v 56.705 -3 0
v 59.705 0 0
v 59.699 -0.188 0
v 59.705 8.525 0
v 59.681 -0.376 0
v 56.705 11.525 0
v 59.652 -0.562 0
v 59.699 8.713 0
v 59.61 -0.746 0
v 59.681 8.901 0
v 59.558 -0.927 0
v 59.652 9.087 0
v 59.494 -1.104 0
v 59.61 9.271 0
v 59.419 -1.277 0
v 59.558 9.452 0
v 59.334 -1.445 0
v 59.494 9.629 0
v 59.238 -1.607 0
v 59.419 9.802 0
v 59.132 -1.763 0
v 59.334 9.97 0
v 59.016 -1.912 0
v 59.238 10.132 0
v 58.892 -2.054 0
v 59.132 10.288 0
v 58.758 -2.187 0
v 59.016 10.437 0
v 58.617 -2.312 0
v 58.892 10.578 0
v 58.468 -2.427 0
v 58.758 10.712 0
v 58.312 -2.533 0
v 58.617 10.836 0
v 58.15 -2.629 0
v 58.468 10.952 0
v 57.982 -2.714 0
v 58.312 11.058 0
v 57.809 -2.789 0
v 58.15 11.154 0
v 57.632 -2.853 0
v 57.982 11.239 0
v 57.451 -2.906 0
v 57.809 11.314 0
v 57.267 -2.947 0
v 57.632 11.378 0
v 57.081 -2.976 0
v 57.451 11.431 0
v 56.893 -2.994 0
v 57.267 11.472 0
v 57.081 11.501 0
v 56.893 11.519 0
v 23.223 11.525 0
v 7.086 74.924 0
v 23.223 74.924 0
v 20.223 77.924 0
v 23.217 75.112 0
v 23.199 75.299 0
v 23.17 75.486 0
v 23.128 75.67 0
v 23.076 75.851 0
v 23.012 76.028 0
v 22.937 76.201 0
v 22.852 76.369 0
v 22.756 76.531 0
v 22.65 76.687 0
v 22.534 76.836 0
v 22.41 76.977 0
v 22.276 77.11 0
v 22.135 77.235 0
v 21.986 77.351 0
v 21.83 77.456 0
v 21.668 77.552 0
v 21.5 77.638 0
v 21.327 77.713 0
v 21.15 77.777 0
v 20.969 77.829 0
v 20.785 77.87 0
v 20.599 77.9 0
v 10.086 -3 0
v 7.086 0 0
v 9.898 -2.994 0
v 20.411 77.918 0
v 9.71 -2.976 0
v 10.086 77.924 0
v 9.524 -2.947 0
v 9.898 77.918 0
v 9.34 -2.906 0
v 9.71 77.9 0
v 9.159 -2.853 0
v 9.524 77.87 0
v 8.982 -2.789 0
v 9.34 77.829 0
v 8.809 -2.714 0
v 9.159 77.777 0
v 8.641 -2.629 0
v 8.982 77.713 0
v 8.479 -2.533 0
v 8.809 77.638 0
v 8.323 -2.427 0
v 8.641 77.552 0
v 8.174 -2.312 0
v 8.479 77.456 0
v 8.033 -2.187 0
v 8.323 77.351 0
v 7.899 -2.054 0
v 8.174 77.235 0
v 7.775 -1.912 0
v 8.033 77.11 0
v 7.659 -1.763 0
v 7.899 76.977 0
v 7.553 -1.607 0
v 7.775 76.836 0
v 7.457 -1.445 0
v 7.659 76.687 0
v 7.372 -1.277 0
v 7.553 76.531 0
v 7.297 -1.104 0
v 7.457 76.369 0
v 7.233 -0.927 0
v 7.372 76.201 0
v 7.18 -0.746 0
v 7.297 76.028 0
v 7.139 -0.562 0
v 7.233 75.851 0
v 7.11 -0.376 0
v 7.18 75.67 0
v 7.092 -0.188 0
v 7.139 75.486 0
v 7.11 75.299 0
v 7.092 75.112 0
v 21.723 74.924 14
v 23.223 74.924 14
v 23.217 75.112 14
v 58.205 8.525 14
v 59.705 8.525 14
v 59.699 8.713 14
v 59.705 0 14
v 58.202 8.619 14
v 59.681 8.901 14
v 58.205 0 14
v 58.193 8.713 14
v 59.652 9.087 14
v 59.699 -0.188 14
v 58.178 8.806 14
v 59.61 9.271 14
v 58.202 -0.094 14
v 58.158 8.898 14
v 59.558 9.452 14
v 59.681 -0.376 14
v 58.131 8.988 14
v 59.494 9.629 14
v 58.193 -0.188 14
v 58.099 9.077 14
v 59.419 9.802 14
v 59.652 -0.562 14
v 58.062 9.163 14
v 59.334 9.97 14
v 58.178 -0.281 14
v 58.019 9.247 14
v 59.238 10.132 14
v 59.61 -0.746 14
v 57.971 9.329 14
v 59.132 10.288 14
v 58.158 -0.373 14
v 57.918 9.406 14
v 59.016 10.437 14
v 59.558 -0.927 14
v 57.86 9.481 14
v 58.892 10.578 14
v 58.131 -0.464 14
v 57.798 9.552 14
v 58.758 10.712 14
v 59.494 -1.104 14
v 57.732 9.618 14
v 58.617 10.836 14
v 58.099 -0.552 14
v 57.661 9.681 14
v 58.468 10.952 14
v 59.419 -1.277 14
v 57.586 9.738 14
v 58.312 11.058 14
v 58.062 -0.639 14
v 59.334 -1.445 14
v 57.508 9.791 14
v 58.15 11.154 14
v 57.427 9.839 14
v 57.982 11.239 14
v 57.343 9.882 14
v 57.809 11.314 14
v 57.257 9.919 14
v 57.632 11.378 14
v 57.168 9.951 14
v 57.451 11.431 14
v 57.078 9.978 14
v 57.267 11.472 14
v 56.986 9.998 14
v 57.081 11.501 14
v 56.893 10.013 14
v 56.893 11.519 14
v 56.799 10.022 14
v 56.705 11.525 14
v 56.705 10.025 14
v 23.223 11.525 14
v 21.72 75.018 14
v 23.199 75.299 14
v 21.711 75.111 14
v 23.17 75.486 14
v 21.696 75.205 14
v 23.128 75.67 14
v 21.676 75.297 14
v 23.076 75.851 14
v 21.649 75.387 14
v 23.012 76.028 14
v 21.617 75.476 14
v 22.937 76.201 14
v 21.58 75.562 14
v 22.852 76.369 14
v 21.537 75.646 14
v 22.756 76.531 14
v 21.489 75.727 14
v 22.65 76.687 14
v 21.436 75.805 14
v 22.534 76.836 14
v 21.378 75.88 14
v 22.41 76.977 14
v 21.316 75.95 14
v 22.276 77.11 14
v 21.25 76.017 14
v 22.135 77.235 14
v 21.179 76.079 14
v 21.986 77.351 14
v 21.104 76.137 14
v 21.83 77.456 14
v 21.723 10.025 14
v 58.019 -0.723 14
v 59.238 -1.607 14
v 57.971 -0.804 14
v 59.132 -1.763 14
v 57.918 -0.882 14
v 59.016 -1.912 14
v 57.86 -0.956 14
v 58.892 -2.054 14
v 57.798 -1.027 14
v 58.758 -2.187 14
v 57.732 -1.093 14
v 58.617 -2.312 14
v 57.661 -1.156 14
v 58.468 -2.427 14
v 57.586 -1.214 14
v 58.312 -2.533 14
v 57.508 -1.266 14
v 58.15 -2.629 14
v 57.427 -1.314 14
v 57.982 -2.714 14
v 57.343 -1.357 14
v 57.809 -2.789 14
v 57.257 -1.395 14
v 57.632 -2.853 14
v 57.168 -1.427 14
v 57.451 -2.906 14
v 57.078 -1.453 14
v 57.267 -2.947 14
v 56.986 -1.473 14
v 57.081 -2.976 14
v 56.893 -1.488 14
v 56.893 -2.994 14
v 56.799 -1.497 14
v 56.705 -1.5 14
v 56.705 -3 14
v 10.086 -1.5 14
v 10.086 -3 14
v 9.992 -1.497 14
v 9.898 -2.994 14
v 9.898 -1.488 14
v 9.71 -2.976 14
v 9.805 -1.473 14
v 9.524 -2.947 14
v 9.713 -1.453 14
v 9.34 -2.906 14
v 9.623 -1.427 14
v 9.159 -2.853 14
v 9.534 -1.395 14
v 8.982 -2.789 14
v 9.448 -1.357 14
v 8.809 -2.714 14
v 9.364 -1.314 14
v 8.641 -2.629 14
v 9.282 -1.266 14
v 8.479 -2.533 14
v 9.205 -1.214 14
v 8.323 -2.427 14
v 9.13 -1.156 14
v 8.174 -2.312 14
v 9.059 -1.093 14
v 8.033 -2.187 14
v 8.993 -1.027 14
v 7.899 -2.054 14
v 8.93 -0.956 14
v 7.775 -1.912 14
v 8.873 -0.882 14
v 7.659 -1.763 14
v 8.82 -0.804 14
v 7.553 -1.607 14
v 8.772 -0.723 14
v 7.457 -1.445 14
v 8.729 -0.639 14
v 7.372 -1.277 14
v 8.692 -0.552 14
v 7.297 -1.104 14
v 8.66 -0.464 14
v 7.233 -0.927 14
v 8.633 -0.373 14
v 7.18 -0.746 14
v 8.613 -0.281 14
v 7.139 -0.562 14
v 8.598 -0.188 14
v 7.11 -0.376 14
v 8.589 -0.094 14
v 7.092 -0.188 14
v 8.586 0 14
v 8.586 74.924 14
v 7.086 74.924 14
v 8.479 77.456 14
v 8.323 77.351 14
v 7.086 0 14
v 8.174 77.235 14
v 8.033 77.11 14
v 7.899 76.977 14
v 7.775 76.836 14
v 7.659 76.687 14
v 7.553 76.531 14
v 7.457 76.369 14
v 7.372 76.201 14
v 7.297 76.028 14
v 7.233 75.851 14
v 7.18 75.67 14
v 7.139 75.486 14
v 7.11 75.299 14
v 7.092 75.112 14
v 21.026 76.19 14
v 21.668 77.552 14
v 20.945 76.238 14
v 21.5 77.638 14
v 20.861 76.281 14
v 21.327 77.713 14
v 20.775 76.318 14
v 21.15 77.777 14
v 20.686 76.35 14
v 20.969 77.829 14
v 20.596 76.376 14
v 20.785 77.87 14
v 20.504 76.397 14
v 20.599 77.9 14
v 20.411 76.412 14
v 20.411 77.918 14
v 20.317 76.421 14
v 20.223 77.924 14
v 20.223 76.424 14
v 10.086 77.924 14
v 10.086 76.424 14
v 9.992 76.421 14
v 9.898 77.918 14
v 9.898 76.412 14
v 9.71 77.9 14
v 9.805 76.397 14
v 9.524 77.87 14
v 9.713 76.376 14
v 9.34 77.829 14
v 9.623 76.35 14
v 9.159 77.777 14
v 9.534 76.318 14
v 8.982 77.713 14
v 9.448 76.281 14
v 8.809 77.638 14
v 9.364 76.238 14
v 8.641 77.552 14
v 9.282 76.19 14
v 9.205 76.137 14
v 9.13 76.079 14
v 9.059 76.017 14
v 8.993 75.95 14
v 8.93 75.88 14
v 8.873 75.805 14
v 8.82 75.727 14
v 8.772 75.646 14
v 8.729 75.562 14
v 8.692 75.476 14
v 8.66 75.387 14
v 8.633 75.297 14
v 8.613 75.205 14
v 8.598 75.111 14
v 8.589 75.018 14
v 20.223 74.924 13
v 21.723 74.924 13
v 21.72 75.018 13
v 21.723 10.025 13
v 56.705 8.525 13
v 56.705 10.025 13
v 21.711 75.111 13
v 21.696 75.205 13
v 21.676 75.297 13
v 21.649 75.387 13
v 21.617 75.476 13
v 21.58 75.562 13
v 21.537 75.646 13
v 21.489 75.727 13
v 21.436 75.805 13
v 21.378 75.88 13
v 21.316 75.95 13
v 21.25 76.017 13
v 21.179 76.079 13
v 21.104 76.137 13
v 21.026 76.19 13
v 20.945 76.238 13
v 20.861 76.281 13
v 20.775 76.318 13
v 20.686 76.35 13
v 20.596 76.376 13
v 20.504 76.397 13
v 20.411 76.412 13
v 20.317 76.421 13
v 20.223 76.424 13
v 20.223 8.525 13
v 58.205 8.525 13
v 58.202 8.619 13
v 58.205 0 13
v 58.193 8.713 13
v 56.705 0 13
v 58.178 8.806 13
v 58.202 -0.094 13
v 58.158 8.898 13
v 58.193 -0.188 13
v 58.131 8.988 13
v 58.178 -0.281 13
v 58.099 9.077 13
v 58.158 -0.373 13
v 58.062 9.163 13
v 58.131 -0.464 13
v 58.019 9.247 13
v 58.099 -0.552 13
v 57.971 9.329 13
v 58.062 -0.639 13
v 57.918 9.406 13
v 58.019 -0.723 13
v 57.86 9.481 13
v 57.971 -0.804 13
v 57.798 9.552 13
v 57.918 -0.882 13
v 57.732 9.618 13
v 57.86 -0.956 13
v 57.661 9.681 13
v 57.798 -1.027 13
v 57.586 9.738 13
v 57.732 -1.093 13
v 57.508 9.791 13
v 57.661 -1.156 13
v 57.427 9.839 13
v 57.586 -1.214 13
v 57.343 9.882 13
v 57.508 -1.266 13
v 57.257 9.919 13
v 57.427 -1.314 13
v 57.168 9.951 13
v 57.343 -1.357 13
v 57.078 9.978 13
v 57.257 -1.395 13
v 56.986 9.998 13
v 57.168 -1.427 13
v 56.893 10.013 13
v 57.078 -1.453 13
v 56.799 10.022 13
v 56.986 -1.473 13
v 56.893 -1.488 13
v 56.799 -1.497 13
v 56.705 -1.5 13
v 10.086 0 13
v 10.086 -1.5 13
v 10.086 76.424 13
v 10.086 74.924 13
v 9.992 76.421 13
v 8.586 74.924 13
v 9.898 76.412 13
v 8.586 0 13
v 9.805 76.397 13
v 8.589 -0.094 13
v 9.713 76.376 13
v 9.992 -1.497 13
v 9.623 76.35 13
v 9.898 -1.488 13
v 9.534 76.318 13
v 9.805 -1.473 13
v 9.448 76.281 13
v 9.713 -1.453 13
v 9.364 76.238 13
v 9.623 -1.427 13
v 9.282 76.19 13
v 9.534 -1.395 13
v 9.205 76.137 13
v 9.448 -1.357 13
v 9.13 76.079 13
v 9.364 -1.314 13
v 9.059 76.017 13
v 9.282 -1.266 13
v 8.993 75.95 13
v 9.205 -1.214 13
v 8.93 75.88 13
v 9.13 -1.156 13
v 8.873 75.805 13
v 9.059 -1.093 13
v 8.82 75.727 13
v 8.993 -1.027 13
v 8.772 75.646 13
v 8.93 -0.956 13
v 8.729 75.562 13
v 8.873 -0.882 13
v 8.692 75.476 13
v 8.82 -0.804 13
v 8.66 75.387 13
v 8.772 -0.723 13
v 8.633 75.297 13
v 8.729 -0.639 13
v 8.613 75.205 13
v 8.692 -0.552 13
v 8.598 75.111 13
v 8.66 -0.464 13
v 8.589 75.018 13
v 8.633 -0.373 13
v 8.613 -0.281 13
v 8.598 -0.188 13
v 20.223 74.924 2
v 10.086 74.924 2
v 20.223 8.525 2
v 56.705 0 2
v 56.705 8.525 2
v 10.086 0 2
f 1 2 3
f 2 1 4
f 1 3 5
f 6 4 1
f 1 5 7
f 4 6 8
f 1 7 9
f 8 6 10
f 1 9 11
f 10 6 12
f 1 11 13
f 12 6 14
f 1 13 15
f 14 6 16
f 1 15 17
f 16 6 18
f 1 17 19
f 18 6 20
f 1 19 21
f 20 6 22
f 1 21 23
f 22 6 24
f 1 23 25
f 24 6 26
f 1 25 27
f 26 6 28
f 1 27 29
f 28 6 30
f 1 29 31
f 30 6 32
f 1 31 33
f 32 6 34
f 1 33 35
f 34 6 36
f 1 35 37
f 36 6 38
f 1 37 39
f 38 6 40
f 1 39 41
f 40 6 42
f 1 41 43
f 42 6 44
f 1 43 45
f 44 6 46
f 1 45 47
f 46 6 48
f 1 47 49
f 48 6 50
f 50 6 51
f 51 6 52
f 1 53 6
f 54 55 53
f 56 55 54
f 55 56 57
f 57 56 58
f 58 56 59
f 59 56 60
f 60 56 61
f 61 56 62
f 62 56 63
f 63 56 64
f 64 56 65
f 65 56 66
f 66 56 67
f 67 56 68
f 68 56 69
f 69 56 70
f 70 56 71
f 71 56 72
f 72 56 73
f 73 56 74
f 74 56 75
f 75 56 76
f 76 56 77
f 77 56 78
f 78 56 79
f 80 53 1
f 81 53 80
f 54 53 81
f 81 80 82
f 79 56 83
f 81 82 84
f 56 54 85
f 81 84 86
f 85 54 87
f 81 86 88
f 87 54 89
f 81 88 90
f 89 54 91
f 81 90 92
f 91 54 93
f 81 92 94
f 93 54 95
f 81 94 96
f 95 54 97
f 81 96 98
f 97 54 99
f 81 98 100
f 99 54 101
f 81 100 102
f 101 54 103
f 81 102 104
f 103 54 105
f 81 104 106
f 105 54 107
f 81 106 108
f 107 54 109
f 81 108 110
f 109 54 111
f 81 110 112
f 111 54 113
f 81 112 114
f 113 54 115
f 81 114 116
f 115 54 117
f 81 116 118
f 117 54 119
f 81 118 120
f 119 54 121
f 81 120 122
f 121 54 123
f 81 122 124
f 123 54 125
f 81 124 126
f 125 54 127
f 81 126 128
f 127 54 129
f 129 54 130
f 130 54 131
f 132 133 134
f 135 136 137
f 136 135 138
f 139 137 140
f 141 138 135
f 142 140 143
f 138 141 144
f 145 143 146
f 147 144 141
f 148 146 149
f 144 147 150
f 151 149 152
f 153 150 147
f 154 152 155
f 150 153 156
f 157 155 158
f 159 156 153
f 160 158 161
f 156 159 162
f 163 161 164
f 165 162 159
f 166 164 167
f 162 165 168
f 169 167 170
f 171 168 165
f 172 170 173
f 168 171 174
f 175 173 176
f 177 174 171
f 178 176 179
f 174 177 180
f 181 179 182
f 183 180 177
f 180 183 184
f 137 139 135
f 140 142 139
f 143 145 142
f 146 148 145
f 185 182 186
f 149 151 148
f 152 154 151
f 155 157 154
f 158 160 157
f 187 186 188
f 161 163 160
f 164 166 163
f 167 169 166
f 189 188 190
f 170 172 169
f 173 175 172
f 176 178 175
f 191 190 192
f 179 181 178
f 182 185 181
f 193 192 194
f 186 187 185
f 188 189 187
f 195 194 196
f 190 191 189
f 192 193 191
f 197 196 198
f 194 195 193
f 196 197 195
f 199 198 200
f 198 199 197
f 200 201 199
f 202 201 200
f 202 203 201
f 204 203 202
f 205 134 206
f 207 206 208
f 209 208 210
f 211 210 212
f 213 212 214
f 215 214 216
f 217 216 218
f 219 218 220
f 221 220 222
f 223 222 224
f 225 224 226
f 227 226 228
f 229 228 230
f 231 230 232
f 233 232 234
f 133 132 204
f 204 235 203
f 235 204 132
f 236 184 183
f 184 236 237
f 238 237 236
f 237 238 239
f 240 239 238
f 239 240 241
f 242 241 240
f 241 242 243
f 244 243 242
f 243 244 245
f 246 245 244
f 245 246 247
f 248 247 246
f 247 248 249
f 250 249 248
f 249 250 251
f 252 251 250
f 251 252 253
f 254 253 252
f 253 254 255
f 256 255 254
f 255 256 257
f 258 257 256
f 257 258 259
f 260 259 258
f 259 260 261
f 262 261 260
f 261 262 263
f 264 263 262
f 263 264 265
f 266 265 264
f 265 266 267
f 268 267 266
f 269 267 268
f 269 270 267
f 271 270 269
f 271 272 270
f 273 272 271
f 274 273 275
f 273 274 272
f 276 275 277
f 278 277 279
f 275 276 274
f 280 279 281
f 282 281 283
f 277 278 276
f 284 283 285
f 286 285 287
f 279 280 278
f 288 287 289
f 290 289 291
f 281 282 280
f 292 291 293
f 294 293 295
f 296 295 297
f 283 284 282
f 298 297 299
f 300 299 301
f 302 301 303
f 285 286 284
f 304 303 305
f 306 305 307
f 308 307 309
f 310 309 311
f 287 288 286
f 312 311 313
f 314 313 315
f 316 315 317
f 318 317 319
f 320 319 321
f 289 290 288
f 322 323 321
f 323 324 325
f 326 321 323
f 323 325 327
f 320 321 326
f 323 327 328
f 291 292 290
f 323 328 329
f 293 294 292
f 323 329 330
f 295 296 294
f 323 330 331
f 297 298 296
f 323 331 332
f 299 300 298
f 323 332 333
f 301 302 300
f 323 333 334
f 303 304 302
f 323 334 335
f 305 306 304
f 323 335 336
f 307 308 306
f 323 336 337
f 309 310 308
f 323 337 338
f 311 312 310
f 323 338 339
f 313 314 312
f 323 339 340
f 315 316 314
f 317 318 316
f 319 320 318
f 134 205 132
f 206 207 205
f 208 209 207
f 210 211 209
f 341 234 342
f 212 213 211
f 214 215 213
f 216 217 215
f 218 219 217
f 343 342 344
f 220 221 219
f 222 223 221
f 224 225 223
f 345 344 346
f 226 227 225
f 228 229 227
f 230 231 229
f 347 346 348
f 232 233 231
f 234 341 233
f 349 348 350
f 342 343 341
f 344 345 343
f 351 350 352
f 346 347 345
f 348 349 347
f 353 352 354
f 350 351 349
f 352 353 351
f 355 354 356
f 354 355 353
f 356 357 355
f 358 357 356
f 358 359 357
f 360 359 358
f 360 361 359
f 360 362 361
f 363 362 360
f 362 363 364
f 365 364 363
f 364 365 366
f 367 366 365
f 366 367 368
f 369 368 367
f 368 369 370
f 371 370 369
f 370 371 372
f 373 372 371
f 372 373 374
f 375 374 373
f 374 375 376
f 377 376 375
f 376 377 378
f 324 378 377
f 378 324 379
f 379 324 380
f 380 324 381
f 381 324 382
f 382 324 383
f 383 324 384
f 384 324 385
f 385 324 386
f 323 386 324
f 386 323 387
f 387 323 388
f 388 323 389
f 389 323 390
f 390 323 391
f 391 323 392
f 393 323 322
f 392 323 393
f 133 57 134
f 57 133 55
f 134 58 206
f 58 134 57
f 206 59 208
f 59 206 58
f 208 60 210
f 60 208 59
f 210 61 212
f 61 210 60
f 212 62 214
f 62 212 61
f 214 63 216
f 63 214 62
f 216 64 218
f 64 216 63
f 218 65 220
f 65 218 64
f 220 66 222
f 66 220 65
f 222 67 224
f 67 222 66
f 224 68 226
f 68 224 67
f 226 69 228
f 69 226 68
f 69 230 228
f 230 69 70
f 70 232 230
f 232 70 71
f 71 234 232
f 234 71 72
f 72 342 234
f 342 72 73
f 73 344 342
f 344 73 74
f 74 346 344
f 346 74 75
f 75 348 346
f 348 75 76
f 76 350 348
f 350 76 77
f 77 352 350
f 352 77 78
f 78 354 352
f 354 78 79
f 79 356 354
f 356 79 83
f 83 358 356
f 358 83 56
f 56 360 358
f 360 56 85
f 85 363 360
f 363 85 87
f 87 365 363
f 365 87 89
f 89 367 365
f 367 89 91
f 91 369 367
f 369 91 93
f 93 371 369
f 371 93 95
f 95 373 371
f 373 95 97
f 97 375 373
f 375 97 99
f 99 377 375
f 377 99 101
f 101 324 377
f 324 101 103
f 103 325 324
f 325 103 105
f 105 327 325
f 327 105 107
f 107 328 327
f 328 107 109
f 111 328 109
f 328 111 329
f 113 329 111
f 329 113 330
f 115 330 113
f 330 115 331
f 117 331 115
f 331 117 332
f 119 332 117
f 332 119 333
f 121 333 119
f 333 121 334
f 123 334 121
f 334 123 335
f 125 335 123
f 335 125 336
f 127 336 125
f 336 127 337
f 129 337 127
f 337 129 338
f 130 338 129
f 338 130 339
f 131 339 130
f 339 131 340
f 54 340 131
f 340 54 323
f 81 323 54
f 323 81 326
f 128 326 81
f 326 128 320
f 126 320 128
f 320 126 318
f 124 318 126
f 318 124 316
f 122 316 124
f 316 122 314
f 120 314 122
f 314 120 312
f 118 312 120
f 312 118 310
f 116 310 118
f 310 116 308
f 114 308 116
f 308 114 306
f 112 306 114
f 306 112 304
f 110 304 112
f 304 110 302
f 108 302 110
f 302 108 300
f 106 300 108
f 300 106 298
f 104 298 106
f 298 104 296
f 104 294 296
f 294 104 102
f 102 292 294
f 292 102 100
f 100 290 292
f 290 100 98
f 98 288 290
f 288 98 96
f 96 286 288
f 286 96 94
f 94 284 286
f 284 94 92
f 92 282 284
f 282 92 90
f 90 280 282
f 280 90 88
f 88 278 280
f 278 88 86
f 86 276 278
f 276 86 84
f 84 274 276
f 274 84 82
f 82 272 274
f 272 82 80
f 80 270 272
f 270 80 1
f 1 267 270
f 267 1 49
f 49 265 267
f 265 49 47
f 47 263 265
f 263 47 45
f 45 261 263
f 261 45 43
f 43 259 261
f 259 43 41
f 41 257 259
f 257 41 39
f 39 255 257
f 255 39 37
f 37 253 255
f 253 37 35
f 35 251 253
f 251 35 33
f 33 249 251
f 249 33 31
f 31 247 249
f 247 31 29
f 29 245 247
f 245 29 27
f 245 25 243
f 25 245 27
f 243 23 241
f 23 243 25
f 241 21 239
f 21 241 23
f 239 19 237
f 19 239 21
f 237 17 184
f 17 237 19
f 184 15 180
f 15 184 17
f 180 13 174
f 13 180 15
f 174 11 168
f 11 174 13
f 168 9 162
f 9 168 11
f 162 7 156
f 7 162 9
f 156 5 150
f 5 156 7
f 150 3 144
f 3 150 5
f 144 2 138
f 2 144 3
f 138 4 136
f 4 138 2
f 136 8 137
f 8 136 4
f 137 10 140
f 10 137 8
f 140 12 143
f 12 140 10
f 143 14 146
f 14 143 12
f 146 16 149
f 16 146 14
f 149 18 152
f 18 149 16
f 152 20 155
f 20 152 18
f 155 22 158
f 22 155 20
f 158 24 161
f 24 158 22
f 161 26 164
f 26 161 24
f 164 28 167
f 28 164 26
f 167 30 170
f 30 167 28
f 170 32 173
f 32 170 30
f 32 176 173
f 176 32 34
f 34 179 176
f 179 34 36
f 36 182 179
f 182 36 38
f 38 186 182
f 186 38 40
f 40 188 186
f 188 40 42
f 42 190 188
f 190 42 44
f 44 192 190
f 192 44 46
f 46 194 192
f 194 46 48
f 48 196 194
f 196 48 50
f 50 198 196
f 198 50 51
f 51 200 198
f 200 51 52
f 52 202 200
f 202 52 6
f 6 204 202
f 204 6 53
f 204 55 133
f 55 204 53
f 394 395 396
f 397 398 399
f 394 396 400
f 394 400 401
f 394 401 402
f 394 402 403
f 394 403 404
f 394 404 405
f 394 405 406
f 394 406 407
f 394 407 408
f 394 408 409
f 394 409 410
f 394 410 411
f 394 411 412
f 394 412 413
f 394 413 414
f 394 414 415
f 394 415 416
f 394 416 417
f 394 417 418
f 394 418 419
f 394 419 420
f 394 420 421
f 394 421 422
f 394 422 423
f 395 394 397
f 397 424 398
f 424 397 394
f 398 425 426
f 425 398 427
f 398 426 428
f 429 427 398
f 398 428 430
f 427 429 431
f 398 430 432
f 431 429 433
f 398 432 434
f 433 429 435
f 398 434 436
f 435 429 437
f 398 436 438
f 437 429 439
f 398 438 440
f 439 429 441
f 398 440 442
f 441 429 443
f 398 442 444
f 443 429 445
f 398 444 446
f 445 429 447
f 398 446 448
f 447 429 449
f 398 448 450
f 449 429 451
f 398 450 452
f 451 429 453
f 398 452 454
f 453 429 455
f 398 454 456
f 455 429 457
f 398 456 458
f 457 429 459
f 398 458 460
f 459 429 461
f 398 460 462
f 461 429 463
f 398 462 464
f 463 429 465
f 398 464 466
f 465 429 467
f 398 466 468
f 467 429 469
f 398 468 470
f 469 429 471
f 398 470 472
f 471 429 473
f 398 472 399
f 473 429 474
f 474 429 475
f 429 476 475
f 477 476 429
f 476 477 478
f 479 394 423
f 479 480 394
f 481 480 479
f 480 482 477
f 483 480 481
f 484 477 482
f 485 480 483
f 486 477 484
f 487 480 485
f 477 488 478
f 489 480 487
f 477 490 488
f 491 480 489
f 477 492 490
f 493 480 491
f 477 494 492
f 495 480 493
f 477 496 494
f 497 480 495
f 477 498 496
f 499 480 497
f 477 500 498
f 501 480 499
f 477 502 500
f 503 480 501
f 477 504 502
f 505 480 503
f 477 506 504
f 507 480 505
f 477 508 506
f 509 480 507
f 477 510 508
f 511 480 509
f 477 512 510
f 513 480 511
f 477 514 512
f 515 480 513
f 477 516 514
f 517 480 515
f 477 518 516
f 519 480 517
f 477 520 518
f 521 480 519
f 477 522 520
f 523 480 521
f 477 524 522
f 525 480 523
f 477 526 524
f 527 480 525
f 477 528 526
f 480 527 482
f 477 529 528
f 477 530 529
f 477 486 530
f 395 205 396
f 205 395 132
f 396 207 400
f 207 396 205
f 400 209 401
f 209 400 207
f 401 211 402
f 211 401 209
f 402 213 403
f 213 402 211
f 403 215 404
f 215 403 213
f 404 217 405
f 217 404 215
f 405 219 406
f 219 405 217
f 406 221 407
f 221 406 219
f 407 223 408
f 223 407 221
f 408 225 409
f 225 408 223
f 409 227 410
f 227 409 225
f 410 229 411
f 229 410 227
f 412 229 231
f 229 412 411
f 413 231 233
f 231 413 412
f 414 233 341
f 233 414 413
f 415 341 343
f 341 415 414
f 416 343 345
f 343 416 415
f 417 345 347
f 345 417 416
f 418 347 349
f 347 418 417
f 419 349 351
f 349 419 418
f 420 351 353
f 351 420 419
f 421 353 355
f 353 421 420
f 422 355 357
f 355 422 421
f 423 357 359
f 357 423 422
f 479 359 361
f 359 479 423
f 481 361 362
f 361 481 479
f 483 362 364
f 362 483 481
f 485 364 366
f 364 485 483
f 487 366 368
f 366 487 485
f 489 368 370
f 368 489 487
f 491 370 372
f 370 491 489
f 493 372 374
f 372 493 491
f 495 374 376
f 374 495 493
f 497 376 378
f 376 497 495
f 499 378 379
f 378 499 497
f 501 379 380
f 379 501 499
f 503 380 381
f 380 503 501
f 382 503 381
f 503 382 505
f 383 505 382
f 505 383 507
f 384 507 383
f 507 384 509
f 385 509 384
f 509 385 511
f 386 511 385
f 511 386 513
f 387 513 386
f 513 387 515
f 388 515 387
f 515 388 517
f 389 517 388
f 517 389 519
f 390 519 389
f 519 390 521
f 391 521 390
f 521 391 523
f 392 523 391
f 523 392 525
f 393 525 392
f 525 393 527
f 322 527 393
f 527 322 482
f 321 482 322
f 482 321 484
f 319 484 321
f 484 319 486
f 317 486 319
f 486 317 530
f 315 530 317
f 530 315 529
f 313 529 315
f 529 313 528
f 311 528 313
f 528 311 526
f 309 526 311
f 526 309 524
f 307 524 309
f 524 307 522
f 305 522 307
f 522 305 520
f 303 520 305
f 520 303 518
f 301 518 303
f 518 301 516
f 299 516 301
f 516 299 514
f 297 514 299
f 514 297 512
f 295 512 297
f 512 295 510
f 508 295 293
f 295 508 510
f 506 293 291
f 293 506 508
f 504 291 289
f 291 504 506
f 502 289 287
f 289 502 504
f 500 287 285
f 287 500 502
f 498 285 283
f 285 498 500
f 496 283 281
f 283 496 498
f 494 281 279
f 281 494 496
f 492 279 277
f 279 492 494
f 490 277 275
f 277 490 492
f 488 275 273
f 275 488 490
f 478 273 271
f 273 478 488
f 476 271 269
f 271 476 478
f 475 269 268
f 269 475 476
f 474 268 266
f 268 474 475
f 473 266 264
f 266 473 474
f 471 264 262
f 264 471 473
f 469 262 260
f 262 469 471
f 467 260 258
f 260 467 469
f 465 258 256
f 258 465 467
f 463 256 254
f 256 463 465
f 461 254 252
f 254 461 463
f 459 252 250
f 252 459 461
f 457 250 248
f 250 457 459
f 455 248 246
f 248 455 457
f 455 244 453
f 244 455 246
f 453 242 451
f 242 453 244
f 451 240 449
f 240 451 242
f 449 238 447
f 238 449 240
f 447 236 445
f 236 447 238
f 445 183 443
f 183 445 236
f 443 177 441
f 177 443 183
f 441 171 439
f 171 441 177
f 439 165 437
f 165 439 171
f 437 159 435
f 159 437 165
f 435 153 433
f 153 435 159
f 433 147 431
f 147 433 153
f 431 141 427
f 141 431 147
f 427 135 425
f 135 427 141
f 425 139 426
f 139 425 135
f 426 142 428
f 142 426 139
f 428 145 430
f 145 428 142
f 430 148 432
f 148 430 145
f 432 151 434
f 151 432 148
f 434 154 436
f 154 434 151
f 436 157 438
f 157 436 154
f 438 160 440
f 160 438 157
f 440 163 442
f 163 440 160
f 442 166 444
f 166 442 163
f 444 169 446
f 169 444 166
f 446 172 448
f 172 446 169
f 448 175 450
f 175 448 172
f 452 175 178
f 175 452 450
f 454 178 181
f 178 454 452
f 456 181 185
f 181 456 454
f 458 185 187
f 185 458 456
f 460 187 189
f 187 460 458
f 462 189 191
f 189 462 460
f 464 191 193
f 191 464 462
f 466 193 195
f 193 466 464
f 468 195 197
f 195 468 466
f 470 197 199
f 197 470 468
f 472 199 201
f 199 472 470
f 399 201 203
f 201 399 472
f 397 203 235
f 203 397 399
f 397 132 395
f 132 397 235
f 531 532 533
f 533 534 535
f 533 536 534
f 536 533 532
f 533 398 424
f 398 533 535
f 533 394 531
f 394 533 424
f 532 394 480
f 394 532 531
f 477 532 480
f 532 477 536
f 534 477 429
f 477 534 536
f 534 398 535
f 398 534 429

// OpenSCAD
//Sign body maker V3 - bigclivedotcom
letter = "L"; //Sign character to make
style = "Noto Mono"; //See "Help" and "Font List"
size = 80; //Size of character (height)
depth = 14; //Depth of sign character
$fn=100; //Curve facets - higher is smoother
walls = 3; //Side wall thickness
base=2; //Base thickness (-1 for open back)
face = 1; //Face thickness
//Don't change variables below here
sized=size-(2*walls);
difference(){
     linear_extrude(height=depth)
	  minkowski(){
	  text(letter,sized,style);
	  circle(walls);
     }
//Lip for front face (half wall thickness)
     translate([0,0,depth-face])
	  linear_extrude(height=2*face)
	  minkowski(){
	  text(letter,sized,style);
	  circle(walls/2);
     }
//hollow core of letter
     translate([0,0,base])
	  linear_extrude(height=depth+2)
	  text(letter,sized,style);
}
